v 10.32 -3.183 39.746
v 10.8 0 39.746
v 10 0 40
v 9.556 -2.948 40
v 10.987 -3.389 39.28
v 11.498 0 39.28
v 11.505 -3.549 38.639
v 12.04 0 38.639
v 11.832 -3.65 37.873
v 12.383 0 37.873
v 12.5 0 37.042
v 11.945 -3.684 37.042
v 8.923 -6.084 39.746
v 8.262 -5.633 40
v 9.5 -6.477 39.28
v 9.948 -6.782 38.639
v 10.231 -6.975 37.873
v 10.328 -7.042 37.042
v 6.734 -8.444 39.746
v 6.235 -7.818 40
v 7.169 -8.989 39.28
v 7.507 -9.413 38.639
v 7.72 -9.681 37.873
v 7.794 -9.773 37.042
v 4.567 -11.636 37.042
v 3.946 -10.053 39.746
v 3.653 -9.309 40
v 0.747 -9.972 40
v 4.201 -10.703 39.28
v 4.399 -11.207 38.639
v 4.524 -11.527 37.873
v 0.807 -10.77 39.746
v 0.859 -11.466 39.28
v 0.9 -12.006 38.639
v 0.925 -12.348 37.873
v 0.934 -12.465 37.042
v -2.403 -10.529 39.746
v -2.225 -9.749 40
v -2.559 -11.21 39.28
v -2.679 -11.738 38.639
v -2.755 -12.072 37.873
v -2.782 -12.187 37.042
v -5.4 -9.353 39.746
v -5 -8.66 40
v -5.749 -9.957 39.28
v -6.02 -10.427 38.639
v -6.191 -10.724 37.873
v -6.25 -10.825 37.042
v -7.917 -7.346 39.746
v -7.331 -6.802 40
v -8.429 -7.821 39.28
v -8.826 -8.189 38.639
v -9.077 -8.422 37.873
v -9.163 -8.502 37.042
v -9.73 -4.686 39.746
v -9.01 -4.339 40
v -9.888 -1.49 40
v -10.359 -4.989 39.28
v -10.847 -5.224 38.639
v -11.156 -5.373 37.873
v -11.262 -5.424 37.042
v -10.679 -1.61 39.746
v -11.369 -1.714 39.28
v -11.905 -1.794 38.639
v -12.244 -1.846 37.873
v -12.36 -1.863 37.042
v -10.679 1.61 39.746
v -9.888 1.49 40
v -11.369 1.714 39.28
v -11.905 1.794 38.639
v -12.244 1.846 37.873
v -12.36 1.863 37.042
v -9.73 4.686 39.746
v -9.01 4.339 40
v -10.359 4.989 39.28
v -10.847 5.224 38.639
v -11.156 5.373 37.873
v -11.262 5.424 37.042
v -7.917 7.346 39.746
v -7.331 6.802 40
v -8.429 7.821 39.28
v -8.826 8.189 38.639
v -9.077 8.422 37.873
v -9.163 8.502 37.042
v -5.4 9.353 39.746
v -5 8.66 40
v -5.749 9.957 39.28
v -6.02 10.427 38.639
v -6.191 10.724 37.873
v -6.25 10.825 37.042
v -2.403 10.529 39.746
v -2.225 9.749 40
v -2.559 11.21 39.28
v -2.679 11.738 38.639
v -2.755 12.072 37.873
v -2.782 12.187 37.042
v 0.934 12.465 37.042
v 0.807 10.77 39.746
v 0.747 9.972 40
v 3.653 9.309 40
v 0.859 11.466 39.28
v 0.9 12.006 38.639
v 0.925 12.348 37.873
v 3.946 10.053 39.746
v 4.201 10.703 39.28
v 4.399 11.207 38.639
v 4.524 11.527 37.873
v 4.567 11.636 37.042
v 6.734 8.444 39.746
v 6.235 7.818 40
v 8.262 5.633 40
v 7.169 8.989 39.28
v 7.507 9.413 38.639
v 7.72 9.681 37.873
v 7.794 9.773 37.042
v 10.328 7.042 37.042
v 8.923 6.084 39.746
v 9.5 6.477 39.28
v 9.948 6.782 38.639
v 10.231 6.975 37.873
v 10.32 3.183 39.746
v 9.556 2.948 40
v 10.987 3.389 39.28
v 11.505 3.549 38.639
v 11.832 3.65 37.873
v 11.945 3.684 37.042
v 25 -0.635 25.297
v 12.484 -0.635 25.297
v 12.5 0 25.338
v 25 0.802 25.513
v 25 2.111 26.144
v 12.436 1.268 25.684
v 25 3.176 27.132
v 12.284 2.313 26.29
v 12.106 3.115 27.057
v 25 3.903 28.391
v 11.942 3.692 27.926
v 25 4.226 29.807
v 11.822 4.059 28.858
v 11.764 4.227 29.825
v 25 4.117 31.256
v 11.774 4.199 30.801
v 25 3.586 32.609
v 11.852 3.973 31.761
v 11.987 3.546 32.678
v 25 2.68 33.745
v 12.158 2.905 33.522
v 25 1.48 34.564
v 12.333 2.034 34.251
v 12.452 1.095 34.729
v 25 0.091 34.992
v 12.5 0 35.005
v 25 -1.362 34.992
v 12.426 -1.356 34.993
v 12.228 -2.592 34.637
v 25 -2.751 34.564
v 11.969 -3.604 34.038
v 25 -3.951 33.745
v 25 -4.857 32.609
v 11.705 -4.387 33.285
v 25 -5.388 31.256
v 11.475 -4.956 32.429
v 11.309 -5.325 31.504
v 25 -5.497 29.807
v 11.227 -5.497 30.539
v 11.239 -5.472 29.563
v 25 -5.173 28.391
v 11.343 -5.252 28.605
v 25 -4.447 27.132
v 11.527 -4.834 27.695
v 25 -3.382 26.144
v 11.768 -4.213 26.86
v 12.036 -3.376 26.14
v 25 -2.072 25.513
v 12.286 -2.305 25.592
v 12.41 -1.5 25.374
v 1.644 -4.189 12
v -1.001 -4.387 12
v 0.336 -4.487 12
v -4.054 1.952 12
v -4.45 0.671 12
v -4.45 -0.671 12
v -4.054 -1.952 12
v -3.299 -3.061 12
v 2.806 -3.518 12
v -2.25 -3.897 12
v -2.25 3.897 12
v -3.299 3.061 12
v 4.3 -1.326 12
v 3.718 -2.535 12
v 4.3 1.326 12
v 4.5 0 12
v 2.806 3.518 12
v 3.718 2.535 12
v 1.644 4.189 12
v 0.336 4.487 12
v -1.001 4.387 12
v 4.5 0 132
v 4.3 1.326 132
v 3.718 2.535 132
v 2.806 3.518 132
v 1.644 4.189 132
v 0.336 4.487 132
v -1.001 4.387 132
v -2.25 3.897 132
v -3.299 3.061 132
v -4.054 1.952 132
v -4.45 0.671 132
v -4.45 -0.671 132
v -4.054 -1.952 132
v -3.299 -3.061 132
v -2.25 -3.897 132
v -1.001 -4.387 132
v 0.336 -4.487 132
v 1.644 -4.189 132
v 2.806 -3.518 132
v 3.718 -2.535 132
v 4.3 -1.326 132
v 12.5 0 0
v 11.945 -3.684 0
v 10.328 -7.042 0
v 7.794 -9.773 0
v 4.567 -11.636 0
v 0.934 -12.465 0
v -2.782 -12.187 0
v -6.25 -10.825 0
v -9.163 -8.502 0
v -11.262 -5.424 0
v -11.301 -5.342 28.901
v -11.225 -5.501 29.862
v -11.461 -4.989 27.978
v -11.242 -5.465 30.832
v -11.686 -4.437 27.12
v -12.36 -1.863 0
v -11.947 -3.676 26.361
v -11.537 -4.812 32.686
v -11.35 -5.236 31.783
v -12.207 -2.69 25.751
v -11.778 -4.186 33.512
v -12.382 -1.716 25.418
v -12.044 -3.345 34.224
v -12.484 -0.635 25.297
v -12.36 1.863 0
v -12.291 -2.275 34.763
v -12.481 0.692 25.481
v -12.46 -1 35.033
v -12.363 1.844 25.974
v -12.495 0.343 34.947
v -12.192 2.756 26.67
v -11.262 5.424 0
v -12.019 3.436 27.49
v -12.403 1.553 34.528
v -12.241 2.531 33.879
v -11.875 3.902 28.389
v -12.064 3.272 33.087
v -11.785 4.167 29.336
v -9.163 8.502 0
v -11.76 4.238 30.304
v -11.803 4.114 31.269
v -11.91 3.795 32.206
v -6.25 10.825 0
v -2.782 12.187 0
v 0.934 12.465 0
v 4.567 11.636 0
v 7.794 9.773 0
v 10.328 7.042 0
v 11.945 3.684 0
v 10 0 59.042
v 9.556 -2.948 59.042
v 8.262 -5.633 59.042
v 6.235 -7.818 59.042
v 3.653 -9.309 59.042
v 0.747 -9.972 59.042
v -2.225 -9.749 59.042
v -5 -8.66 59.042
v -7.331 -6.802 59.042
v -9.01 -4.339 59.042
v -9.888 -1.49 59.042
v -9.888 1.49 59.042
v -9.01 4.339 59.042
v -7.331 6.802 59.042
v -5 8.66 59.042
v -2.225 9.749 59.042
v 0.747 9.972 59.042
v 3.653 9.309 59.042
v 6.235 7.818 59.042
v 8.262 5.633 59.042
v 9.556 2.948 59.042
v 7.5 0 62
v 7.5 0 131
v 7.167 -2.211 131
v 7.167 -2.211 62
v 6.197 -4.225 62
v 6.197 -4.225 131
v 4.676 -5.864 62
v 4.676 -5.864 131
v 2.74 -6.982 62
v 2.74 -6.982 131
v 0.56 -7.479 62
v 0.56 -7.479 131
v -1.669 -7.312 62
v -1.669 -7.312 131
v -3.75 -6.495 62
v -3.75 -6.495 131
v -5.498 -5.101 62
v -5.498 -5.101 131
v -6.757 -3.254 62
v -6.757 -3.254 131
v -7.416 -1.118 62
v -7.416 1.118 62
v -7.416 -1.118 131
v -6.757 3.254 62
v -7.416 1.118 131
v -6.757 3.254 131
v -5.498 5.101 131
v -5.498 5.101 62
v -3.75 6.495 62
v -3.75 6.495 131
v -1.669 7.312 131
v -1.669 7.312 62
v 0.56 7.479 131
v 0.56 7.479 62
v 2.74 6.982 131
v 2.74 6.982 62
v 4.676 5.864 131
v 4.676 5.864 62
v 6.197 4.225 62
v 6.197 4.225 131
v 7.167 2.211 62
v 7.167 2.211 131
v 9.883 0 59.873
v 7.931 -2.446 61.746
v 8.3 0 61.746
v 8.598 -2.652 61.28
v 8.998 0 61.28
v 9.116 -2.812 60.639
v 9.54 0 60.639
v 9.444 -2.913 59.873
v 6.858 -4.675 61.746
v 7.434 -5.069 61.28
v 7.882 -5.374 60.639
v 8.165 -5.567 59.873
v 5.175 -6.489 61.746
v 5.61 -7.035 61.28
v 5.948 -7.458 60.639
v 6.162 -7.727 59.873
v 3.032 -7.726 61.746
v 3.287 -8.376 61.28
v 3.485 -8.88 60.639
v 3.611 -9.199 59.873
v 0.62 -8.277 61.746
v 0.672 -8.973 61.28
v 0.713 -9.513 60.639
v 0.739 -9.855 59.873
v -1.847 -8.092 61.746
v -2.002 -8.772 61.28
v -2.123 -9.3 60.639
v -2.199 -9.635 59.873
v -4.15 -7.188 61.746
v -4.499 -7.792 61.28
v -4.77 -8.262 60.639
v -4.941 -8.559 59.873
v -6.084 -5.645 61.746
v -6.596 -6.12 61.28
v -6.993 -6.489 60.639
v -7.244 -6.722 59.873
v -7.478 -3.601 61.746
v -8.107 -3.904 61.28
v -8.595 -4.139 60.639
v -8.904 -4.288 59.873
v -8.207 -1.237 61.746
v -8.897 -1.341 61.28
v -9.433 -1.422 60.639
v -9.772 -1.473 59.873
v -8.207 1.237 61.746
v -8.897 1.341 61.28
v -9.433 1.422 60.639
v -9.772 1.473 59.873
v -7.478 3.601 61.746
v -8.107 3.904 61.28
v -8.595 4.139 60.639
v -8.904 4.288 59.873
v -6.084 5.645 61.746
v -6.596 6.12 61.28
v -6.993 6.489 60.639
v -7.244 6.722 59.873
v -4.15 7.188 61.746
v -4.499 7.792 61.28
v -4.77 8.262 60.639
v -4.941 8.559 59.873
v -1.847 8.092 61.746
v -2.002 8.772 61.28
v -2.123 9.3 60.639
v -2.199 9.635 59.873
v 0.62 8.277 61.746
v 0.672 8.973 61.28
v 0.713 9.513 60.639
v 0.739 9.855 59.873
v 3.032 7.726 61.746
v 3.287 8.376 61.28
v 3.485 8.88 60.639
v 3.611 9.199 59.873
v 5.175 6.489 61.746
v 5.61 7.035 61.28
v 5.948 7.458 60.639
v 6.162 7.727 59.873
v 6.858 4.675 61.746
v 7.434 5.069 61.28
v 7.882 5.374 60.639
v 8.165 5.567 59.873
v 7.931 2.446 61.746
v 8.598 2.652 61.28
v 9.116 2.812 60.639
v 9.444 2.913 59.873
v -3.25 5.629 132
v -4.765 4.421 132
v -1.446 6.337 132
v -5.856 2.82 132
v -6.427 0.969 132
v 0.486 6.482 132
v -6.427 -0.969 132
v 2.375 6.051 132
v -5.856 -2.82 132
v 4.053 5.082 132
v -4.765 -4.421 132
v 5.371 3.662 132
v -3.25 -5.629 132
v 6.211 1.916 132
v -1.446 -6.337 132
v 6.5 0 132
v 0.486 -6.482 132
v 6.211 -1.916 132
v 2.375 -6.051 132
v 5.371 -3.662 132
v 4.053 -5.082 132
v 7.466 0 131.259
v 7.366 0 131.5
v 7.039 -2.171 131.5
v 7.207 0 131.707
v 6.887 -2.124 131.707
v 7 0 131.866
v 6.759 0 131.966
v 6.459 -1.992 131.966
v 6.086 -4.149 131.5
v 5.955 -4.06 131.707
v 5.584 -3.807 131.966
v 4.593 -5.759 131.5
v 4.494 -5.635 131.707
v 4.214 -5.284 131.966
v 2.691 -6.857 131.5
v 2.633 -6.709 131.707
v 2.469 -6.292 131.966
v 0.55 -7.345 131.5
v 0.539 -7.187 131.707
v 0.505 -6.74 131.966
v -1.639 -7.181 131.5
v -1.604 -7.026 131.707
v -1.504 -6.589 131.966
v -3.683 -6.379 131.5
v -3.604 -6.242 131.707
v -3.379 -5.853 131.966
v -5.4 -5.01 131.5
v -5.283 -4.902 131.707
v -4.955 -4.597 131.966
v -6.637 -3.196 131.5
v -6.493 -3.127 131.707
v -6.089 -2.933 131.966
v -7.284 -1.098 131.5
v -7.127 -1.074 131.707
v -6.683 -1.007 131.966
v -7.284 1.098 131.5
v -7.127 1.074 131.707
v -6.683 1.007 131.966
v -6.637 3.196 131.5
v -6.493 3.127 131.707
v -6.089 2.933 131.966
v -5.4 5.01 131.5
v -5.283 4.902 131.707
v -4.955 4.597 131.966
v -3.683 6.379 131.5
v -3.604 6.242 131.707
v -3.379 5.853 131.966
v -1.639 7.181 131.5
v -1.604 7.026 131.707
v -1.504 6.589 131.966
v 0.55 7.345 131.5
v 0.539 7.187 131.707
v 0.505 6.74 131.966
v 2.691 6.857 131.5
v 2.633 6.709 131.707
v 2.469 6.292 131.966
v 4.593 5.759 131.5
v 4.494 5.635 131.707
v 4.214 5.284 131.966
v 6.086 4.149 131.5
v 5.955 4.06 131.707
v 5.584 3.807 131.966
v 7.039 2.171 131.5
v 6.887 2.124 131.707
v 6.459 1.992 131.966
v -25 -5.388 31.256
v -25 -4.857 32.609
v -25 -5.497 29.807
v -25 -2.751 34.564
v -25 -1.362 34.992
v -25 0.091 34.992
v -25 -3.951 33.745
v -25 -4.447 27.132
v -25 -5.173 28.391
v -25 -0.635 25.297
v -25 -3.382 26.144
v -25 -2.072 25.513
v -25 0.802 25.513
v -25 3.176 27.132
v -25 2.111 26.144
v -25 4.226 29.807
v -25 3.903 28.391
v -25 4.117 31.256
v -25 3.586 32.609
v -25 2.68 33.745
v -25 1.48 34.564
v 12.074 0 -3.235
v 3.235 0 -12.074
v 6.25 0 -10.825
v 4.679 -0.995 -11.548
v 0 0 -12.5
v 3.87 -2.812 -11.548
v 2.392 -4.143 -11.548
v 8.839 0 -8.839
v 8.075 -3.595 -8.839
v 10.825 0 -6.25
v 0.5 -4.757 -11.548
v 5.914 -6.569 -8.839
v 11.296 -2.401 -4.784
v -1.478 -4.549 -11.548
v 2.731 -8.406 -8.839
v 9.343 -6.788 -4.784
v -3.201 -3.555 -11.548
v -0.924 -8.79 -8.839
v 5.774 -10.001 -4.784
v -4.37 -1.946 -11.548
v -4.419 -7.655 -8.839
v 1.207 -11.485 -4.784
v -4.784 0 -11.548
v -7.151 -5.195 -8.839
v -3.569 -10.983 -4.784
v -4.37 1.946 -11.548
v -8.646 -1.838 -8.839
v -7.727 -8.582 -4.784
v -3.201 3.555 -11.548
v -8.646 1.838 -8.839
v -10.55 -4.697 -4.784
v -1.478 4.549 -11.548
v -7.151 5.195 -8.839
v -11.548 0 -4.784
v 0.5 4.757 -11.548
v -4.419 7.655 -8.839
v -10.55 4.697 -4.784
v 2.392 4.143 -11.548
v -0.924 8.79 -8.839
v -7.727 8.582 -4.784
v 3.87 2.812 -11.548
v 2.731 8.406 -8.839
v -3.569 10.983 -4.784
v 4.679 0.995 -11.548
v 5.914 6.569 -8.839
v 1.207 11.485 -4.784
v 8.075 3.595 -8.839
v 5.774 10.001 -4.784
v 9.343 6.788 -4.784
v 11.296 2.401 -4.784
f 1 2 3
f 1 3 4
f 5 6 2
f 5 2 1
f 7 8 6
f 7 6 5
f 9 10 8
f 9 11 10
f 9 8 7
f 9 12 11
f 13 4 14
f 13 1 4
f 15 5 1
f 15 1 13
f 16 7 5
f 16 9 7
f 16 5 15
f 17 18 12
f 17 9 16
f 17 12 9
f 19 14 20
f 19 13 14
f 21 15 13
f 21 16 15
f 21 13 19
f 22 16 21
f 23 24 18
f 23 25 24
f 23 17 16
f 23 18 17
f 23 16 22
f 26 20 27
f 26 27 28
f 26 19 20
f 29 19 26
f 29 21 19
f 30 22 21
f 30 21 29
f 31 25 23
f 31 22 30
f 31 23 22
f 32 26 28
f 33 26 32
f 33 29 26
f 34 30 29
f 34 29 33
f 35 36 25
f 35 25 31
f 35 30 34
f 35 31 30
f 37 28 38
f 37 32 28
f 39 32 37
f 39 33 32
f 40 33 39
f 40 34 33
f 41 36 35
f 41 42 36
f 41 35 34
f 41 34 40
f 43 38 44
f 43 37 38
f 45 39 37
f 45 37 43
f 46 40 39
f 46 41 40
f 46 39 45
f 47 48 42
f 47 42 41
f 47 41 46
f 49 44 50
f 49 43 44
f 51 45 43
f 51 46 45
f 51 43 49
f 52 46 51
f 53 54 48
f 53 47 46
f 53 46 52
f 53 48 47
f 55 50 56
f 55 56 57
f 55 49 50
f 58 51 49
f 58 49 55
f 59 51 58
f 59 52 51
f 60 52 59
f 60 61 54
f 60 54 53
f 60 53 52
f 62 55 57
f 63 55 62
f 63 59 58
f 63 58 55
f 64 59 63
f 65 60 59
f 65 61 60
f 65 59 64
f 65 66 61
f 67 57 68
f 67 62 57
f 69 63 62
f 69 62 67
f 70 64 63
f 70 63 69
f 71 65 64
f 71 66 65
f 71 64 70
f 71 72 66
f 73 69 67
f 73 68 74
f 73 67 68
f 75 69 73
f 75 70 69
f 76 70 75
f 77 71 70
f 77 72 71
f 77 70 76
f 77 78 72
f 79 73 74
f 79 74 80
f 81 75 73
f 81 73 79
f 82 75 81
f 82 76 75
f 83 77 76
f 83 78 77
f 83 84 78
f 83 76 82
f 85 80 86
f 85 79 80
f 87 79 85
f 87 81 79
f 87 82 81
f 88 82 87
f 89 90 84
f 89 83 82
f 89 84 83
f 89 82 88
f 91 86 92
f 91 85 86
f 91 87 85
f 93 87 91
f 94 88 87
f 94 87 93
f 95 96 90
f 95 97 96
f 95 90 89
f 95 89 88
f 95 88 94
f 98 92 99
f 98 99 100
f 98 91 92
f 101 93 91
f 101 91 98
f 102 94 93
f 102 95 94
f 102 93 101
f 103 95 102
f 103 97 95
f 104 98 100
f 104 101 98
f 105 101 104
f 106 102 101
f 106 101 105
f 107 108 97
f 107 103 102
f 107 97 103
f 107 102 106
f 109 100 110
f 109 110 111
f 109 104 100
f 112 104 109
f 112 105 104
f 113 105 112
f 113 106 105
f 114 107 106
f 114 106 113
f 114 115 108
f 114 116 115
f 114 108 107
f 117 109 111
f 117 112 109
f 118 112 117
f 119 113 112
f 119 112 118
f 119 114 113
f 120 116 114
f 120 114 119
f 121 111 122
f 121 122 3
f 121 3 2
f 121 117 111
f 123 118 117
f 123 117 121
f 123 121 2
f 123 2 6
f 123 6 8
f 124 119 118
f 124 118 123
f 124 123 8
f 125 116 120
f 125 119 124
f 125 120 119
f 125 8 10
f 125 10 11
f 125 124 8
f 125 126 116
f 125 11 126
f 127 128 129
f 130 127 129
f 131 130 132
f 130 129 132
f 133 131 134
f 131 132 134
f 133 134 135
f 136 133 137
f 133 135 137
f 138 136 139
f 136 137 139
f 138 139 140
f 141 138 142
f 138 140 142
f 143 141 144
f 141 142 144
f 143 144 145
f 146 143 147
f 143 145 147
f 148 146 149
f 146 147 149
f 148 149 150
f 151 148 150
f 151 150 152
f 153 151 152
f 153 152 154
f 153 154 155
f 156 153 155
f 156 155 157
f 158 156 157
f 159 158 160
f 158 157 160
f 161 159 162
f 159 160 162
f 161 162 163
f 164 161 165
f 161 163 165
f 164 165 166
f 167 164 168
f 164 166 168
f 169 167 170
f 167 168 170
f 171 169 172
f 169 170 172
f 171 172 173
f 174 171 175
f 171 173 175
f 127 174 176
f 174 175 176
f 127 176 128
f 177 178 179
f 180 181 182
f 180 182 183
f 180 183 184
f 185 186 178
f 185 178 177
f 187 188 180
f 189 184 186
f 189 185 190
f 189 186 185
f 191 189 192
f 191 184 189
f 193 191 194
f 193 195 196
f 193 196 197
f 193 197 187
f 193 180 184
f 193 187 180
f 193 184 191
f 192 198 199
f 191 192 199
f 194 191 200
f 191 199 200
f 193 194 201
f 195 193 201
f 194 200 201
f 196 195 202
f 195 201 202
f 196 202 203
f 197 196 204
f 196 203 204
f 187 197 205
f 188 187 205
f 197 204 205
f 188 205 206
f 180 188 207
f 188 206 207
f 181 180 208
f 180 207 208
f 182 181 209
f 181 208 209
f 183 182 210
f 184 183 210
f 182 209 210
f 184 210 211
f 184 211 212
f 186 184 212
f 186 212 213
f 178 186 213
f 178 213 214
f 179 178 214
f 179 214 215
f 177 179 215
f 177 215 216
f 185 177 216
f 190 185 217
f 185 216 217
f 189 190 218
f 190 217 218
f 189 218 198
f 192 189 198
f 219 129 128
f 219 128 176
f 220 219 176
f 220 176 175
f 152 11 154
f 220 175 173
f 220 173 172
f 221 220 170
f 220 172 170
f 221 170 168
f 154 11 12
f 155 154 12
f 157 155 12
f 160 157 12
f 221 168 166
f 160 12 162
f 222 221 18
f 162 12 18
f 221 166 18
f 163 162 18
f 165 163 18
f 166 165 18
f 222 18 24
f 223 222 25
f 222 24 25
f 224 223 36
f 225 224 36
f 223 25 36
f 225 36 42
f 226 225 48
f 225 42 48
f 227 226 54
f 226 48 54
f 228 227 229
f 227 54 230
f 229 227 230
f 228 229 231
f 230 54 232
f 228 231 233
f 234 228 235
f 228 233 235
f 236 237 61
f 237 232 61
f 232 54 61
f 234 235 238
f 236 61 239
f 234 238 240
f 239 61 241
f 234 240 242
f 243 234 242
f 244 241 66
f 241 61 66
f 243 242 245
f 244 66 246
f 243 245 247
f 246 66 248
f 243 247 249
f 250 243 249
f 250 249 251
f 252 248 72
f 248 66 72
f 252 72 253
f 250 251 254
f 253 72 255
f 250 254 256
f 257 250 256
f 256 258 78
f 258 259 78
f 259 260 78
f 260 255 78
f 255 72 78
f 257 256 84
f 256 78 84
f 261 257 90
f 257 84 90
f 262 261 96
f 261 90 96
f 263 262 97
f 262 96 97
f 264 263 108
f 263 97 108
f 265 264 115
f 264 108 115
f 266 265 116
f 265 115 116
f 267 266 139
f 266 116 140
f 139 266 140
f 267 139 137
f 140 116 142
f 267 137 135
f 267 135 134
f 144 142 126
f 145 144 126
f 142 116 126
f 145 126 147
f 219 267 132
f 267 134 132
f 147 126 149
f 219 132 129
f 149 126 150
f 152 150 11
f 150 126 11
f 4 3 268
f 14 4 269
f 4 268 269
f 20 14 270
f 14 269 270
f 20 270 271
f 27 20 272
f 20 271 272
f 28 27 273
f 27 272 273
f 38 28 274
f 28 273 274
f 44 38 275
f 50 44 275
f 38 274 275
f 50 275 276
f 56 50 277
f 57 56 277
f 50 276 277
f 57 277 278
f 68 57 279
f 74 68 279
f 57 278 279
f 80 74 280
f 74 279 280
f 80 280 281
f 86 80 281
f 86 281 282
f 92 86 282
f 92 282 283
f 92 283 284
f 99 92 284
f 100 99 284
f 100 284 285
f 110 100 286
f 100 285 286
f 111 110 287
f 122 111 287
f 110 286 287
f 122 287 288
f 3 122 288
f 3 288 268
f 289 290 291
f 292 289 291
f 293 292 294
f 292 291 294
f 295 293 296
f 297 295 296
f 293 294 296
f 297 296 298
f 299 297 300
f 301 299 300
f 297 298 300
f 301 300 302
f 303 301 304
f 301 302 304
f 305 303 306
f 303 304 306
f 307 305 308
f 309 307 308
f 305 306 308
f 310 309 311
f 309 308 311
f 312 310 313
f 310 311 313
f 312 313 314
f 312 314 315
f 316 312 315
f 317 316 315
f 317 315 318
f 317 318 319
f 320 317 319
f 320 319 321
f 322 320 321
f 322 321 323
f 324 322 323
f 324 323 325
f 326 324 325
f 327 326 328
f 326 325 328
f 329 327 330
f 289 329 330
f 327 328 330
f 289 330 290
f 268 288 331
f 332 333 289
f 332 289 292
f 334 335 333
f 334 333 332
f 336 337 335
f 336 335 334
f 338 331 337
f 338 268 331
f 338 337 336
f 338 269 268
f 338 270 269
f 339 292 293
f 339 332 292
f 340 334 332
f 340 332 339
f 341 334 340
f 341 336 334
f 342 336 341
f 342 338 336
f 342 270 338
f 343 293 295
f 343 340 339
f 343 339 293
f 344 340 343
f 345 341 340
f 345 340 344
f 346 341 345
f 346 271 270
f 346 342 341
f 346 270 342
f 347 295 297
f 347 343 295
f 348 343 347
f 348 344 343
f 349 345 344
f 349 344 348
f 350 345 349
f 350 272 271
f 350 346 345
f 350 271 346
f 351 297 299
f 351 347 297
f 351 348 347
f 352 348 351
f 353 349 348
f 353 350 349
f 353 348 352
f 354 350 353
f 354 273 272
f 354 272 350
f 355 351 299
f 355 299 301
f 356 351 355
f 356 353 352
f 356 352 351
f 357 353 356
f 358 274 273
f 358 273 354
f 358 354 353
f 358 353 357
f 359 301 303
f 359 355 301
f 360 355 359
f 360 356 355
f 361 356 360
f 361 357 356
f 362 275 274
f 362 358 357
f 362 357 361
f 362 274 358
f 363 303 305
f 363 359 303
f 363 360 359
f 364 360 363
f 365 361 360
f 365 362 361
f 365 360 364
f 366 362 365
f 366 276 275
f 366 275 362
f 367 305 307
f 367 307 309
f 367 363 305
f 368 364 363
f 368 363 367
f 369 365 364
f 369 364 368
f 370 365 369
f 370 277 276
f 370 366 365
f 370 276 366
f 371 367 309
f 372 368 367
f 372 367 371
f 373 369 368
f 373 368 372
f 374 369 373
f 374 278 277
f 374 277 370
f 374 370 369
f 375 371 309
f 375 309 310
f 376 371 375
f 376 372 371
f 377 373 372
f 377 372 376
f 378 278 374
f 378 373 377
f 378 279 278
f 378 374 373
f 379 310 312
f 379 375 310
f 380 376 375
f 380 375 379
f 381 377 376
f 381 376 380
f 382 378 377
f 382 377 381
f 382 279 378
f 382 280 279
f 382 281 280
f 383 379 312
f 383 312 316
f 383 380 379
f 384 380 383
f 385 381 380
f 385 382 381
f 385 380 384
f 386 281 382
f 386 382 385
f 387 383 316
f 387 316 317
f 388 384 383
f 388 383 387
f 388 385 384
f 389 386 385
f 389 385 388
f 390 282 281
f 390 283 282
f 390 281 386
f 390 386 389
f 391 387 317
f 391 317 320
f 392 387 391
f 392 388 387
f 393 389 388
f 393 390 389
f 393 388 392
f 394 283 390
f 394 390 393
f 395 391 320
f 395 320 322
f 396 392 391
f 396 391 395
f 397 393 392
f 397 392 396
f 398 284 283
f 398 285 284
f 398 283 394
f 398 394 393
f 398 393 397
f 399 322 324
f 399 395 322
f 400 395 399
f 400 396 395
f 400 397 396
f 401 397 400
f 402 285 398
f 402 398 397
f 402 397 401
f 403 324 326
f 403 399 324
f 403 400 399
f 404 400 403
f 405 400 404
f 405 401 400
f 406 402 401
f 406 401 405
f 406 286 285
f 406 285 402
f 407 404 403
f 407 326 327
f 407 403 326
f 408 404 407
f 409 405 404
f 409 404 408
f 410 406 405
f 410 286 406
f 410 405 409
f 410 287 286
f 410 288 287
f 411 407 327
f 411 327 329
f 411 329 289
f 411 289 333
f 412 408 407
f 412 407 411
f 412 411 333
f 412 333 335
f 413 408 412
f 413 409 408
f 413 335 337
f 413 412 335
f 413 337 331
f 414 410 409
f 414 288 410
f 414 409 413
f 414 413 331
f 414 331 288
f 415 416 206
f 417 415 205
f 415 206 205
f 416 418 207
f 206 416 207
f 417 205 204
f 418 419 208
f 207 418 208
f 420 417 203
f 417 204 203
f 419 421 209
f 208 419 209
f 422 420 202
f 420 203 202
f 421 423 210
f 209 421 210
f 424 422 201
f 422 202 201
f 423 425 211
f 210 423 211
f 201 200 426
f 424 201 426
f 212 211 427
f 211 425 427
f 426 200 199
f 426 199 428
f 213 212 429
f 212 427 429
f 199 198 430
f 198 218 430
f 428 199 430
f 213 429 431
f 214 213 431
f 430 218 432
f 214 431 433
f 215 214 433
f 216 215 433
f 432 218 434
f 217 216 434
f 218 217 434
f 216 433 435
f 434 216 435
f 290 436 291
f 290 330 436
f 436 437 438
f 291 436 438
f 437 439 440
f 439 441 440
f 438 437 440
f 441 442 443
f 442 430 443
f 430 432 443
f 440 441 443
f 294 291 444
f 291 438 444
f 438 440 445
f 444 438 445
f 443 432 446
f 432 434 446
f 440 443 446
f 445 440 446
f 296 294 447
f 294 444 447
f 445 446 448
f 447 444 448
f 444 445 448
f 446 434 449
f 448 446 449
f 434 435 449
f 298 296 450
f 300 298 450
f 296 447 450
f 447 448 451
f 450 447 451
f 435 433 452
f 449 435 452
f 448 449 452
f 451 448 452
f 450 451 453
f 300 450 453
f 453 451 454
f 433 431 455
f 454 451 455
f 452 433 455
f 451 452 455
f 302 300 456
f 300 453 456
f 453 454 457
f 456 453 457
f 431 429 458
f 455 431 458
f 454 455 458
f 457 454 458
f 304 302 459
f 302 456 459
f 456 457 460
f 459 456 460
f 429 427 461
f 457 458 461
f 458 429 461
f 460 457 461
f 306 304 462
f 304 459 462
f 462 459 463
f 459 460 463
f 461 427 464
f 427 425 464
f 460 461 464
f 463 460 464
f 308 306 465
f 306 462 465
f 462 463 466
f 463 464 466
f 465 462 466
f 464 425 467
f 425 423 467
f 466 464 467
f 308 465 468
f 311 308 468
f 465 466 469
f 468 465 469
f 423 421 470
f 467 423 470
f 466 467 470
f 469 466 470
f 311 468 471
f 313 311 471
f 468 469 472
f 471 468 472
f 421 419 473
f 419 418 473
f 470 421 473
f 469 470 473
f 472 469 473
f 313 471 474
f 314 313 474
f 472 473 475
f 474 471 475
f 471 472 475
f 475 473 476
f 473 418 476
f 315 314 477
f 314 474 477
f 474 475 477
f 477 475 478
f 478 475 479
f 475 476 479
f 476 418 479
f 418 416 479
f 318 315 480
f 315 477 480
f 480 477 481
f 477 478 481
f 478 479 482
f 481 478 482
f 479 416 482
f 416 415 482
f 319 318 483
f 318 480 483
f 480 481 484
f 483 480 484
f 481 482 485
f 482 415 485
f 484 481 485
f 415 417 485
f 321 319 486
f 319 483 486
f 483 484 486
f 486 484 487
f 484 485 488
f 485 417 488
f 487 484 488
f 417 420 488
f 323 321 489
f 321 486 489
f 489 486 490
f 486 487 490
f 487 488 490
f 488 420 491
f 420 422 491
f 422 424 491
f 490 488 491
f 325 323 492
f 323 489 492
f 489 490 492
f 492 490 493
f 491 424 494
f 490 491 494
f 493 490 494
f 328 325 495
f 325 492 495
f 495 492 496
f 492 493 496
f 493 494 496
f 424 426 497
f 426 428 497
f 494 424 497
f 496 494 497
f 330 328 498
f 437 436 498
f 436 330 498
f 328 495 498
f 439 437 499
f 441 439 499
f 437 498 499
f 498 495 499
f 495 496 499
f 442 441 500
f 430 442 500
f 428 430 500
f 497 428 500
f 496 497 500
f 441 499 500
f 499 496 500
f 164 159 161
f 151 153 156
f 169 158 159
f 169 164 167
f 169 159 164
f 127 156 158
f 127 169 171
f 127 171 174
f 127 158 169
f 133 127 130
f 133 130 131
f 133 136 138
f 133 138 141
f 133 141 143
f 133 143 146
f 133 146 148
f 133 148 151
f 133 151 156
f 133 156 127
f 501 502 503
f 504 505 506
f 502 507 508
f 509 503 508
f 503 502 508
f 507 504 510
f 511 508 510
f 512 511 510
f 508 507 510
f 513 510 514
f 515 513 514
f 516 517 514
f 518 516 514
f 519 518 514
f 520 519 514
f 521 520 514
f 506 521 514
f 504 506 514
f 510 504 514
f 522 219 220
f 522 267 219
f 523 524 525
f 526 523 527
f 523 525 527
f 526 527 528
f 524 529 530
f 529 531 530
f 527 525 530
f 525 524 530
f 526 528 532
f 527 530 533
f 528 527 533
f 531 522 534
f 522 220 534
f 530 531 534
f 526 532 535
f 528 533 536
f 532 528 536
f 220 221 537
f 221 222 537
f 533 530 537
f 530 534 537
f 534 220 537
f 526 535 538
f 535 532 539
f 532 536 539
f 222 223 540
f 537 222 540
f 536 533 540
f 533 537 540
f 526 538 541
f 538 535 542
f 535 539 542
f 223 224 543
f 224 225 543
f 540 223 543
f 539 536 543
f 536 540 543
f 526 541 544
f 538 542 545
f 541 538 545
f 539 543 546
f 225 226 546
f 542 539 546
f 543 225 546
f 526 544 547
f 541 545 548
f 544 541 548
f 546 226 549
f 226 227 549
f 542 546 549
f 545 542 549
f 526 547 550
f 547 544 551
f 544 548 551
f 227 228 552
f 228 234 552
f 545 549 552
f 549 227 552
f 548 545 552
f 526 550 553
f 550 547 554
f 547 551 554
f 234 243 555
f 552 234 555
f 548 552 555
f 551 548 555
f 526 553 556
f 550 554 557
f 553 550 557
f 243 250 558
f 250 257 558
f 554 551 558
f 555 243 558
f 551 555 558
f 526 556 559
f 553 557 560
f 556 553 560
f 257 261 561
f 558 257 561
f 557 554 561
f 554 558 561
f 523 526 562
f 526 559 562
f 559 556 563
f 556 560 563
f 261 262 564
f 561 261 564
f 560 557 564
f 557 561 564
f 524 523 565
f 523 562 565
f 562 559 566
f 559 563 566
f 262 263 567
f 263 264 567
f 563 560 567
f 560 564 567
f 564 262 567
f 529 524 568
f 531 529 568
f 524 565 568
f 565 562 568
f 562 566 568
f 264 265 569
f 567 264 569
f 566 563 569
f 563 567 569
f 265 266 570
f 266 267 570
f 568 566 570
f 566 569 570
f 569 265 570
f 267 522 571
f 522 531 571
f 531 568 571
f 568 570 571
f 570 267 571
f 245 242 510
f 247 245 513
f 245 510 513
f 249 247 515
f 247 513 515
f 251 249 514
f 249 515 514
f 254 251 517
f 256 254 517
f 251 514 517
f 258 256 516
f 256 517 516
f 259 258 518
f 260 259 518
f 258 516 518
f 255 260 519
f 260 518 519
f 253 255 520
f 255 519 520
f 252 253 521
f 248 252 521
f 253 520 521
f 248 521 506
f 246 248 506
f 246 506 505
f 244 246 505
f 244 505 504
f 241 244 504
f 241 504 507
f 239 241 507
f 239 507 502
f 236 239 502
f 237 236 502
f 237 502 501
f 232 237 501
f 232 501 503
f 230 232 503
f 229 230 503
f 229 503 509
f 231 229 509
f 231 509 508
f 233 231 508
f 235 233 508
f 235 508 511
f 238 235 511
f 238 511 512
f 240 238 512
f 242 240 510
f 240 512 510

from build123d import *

# Parameters (mm, degrees)
FILLET2_R                = 3
BOSS_EXTRUDE1_DEPTH      = 25
BOSS_EXTRUDE1_DEPTH_BACK = 25
SKETCH3_R                = 4.875
SKETCH2_R                = 4.5
CUT_EXTRUDE2_DEPTH       = 120
FILLET3_R                = 1


with BuildPart() as part:
    # Sketch1 → Revolve1 (revolve)
    with BuildSketch(Plane(origin=(0, 0, 0), x_dir=(0, 0, -1), z_dir=(1, 0, 0)), mode=Mode.PRIVATE) as revolve1_sk:
        with BuildLine():
            Line((0, 12.5), (-40, 12.5))
            Line((-40, 12.5), (-40, 10))
            Line((-40, 10), (-62, 10))
            Line((-62, 10), (-62, 7.5))
            Line((-62, 7.5), (-132, 7.5))
            Line((-132, 7.5), (-132, 0))
            Line((-132, 0), (12.5, 0))
            ThreePointArc((12.5, 0), (8.838834765, 8.838834765), (0, 12.5))
        make_face()
    revolve(revolve1_sk.sketch.rotate(Axis((0, 0, 132), (0, 0, -1)), 90), axis=Axis((0, 0, 132), (0, 0, -1)))

    # Fillet2
    # the kernel refuses this fillet: 3 mm, written as the material it takes off along each edge
    with BuildSketch(Plane(origin=(0, 0, 40), x_dir=(1, 0, 0), z_dir=(0, 1, 0))) as fillet2_piece_1:
        with BuildLine():
            CenterArc((9.5, 2.958039892), FILLET2_R, 279.594068227, 80.405931773)
            Line((10, 0), (10.01, -0.059160798))
            ThreePointArc((10.01, -0.059160798), (11.25, -0.06), (12.5, -0.06))
            Line((12.5, -0.06), (12.56, 0))
            Line((12.56, 0), (12.56, 2.958039892))
            Line((12.56, 2.958039892), (12.5, 2.958039892))
        make_face()
    revolve(axis=Axis((0, 0, 40), (0, 0, -1)), mode=Mode.SUBTRACT)
    with BuildSketch(Plane(origin=(0, 0, 62), x_dir=(1, 0, 0), z_dir=(0, 1, 0))) as fillet2_piece_2:
        with BuildLine():
            CenterArc((7, 2.958039892), FILLET2_R, 279.594068227, 80.405931773)
            Line((7.5, 0), (7.51, -0.059160798))
            ThreePointArc((7.51, -0.059160798), (8.75, -0.06), (10, -0.06))
            Line((10, -0.06), (10.06, 0))
            Line((10.06, 0), (10.06, 2.958039892))
            Line((10.06, 2.958039892), (10, 2.958039892))
        make_face()
    revolve(axis=Axis((0, 0, 62), (0, 0, -1)), mode=Mode.SUBTRACT)

    # Sketch3 → Boss-Extrude1 (add, two sides: drawn at the far end of the back side and taken through both)
    with BuildSketch(Plane(origin=(0, 0, 0), x_dir=(0, 0, -1), z_dir=(1, 0, 0)).offset(-BOSS_EXTRUDE1_DEPTH_BACK)):
        with Locations((-30.171572875, -0.635390854)):
            Circle(SKETCH3_R)
    extrude(amount=BOSS_EXTRUDE1_DEPTH + BOSS_EXTRUDE1_DEPTH_BACK)

    # Sketch2 → Cut-Extrude2 (cut)
    with BuildSketch(Plane.XY.offset(132)):
        Circle(SKETCH2_R)
    extrude(amount=-CUT_EXTRUDE2_DEPTH, mode=Mode.SUBTRACT)

    # Fillet3
    fillet3_edges = [part.edges().sort_by_distance(p)[0] for p in [
        (-7.5, 0, 132),
    ]]
    fillet(fillet3_edges, radius=FILLET3_R)


solid = part.part
